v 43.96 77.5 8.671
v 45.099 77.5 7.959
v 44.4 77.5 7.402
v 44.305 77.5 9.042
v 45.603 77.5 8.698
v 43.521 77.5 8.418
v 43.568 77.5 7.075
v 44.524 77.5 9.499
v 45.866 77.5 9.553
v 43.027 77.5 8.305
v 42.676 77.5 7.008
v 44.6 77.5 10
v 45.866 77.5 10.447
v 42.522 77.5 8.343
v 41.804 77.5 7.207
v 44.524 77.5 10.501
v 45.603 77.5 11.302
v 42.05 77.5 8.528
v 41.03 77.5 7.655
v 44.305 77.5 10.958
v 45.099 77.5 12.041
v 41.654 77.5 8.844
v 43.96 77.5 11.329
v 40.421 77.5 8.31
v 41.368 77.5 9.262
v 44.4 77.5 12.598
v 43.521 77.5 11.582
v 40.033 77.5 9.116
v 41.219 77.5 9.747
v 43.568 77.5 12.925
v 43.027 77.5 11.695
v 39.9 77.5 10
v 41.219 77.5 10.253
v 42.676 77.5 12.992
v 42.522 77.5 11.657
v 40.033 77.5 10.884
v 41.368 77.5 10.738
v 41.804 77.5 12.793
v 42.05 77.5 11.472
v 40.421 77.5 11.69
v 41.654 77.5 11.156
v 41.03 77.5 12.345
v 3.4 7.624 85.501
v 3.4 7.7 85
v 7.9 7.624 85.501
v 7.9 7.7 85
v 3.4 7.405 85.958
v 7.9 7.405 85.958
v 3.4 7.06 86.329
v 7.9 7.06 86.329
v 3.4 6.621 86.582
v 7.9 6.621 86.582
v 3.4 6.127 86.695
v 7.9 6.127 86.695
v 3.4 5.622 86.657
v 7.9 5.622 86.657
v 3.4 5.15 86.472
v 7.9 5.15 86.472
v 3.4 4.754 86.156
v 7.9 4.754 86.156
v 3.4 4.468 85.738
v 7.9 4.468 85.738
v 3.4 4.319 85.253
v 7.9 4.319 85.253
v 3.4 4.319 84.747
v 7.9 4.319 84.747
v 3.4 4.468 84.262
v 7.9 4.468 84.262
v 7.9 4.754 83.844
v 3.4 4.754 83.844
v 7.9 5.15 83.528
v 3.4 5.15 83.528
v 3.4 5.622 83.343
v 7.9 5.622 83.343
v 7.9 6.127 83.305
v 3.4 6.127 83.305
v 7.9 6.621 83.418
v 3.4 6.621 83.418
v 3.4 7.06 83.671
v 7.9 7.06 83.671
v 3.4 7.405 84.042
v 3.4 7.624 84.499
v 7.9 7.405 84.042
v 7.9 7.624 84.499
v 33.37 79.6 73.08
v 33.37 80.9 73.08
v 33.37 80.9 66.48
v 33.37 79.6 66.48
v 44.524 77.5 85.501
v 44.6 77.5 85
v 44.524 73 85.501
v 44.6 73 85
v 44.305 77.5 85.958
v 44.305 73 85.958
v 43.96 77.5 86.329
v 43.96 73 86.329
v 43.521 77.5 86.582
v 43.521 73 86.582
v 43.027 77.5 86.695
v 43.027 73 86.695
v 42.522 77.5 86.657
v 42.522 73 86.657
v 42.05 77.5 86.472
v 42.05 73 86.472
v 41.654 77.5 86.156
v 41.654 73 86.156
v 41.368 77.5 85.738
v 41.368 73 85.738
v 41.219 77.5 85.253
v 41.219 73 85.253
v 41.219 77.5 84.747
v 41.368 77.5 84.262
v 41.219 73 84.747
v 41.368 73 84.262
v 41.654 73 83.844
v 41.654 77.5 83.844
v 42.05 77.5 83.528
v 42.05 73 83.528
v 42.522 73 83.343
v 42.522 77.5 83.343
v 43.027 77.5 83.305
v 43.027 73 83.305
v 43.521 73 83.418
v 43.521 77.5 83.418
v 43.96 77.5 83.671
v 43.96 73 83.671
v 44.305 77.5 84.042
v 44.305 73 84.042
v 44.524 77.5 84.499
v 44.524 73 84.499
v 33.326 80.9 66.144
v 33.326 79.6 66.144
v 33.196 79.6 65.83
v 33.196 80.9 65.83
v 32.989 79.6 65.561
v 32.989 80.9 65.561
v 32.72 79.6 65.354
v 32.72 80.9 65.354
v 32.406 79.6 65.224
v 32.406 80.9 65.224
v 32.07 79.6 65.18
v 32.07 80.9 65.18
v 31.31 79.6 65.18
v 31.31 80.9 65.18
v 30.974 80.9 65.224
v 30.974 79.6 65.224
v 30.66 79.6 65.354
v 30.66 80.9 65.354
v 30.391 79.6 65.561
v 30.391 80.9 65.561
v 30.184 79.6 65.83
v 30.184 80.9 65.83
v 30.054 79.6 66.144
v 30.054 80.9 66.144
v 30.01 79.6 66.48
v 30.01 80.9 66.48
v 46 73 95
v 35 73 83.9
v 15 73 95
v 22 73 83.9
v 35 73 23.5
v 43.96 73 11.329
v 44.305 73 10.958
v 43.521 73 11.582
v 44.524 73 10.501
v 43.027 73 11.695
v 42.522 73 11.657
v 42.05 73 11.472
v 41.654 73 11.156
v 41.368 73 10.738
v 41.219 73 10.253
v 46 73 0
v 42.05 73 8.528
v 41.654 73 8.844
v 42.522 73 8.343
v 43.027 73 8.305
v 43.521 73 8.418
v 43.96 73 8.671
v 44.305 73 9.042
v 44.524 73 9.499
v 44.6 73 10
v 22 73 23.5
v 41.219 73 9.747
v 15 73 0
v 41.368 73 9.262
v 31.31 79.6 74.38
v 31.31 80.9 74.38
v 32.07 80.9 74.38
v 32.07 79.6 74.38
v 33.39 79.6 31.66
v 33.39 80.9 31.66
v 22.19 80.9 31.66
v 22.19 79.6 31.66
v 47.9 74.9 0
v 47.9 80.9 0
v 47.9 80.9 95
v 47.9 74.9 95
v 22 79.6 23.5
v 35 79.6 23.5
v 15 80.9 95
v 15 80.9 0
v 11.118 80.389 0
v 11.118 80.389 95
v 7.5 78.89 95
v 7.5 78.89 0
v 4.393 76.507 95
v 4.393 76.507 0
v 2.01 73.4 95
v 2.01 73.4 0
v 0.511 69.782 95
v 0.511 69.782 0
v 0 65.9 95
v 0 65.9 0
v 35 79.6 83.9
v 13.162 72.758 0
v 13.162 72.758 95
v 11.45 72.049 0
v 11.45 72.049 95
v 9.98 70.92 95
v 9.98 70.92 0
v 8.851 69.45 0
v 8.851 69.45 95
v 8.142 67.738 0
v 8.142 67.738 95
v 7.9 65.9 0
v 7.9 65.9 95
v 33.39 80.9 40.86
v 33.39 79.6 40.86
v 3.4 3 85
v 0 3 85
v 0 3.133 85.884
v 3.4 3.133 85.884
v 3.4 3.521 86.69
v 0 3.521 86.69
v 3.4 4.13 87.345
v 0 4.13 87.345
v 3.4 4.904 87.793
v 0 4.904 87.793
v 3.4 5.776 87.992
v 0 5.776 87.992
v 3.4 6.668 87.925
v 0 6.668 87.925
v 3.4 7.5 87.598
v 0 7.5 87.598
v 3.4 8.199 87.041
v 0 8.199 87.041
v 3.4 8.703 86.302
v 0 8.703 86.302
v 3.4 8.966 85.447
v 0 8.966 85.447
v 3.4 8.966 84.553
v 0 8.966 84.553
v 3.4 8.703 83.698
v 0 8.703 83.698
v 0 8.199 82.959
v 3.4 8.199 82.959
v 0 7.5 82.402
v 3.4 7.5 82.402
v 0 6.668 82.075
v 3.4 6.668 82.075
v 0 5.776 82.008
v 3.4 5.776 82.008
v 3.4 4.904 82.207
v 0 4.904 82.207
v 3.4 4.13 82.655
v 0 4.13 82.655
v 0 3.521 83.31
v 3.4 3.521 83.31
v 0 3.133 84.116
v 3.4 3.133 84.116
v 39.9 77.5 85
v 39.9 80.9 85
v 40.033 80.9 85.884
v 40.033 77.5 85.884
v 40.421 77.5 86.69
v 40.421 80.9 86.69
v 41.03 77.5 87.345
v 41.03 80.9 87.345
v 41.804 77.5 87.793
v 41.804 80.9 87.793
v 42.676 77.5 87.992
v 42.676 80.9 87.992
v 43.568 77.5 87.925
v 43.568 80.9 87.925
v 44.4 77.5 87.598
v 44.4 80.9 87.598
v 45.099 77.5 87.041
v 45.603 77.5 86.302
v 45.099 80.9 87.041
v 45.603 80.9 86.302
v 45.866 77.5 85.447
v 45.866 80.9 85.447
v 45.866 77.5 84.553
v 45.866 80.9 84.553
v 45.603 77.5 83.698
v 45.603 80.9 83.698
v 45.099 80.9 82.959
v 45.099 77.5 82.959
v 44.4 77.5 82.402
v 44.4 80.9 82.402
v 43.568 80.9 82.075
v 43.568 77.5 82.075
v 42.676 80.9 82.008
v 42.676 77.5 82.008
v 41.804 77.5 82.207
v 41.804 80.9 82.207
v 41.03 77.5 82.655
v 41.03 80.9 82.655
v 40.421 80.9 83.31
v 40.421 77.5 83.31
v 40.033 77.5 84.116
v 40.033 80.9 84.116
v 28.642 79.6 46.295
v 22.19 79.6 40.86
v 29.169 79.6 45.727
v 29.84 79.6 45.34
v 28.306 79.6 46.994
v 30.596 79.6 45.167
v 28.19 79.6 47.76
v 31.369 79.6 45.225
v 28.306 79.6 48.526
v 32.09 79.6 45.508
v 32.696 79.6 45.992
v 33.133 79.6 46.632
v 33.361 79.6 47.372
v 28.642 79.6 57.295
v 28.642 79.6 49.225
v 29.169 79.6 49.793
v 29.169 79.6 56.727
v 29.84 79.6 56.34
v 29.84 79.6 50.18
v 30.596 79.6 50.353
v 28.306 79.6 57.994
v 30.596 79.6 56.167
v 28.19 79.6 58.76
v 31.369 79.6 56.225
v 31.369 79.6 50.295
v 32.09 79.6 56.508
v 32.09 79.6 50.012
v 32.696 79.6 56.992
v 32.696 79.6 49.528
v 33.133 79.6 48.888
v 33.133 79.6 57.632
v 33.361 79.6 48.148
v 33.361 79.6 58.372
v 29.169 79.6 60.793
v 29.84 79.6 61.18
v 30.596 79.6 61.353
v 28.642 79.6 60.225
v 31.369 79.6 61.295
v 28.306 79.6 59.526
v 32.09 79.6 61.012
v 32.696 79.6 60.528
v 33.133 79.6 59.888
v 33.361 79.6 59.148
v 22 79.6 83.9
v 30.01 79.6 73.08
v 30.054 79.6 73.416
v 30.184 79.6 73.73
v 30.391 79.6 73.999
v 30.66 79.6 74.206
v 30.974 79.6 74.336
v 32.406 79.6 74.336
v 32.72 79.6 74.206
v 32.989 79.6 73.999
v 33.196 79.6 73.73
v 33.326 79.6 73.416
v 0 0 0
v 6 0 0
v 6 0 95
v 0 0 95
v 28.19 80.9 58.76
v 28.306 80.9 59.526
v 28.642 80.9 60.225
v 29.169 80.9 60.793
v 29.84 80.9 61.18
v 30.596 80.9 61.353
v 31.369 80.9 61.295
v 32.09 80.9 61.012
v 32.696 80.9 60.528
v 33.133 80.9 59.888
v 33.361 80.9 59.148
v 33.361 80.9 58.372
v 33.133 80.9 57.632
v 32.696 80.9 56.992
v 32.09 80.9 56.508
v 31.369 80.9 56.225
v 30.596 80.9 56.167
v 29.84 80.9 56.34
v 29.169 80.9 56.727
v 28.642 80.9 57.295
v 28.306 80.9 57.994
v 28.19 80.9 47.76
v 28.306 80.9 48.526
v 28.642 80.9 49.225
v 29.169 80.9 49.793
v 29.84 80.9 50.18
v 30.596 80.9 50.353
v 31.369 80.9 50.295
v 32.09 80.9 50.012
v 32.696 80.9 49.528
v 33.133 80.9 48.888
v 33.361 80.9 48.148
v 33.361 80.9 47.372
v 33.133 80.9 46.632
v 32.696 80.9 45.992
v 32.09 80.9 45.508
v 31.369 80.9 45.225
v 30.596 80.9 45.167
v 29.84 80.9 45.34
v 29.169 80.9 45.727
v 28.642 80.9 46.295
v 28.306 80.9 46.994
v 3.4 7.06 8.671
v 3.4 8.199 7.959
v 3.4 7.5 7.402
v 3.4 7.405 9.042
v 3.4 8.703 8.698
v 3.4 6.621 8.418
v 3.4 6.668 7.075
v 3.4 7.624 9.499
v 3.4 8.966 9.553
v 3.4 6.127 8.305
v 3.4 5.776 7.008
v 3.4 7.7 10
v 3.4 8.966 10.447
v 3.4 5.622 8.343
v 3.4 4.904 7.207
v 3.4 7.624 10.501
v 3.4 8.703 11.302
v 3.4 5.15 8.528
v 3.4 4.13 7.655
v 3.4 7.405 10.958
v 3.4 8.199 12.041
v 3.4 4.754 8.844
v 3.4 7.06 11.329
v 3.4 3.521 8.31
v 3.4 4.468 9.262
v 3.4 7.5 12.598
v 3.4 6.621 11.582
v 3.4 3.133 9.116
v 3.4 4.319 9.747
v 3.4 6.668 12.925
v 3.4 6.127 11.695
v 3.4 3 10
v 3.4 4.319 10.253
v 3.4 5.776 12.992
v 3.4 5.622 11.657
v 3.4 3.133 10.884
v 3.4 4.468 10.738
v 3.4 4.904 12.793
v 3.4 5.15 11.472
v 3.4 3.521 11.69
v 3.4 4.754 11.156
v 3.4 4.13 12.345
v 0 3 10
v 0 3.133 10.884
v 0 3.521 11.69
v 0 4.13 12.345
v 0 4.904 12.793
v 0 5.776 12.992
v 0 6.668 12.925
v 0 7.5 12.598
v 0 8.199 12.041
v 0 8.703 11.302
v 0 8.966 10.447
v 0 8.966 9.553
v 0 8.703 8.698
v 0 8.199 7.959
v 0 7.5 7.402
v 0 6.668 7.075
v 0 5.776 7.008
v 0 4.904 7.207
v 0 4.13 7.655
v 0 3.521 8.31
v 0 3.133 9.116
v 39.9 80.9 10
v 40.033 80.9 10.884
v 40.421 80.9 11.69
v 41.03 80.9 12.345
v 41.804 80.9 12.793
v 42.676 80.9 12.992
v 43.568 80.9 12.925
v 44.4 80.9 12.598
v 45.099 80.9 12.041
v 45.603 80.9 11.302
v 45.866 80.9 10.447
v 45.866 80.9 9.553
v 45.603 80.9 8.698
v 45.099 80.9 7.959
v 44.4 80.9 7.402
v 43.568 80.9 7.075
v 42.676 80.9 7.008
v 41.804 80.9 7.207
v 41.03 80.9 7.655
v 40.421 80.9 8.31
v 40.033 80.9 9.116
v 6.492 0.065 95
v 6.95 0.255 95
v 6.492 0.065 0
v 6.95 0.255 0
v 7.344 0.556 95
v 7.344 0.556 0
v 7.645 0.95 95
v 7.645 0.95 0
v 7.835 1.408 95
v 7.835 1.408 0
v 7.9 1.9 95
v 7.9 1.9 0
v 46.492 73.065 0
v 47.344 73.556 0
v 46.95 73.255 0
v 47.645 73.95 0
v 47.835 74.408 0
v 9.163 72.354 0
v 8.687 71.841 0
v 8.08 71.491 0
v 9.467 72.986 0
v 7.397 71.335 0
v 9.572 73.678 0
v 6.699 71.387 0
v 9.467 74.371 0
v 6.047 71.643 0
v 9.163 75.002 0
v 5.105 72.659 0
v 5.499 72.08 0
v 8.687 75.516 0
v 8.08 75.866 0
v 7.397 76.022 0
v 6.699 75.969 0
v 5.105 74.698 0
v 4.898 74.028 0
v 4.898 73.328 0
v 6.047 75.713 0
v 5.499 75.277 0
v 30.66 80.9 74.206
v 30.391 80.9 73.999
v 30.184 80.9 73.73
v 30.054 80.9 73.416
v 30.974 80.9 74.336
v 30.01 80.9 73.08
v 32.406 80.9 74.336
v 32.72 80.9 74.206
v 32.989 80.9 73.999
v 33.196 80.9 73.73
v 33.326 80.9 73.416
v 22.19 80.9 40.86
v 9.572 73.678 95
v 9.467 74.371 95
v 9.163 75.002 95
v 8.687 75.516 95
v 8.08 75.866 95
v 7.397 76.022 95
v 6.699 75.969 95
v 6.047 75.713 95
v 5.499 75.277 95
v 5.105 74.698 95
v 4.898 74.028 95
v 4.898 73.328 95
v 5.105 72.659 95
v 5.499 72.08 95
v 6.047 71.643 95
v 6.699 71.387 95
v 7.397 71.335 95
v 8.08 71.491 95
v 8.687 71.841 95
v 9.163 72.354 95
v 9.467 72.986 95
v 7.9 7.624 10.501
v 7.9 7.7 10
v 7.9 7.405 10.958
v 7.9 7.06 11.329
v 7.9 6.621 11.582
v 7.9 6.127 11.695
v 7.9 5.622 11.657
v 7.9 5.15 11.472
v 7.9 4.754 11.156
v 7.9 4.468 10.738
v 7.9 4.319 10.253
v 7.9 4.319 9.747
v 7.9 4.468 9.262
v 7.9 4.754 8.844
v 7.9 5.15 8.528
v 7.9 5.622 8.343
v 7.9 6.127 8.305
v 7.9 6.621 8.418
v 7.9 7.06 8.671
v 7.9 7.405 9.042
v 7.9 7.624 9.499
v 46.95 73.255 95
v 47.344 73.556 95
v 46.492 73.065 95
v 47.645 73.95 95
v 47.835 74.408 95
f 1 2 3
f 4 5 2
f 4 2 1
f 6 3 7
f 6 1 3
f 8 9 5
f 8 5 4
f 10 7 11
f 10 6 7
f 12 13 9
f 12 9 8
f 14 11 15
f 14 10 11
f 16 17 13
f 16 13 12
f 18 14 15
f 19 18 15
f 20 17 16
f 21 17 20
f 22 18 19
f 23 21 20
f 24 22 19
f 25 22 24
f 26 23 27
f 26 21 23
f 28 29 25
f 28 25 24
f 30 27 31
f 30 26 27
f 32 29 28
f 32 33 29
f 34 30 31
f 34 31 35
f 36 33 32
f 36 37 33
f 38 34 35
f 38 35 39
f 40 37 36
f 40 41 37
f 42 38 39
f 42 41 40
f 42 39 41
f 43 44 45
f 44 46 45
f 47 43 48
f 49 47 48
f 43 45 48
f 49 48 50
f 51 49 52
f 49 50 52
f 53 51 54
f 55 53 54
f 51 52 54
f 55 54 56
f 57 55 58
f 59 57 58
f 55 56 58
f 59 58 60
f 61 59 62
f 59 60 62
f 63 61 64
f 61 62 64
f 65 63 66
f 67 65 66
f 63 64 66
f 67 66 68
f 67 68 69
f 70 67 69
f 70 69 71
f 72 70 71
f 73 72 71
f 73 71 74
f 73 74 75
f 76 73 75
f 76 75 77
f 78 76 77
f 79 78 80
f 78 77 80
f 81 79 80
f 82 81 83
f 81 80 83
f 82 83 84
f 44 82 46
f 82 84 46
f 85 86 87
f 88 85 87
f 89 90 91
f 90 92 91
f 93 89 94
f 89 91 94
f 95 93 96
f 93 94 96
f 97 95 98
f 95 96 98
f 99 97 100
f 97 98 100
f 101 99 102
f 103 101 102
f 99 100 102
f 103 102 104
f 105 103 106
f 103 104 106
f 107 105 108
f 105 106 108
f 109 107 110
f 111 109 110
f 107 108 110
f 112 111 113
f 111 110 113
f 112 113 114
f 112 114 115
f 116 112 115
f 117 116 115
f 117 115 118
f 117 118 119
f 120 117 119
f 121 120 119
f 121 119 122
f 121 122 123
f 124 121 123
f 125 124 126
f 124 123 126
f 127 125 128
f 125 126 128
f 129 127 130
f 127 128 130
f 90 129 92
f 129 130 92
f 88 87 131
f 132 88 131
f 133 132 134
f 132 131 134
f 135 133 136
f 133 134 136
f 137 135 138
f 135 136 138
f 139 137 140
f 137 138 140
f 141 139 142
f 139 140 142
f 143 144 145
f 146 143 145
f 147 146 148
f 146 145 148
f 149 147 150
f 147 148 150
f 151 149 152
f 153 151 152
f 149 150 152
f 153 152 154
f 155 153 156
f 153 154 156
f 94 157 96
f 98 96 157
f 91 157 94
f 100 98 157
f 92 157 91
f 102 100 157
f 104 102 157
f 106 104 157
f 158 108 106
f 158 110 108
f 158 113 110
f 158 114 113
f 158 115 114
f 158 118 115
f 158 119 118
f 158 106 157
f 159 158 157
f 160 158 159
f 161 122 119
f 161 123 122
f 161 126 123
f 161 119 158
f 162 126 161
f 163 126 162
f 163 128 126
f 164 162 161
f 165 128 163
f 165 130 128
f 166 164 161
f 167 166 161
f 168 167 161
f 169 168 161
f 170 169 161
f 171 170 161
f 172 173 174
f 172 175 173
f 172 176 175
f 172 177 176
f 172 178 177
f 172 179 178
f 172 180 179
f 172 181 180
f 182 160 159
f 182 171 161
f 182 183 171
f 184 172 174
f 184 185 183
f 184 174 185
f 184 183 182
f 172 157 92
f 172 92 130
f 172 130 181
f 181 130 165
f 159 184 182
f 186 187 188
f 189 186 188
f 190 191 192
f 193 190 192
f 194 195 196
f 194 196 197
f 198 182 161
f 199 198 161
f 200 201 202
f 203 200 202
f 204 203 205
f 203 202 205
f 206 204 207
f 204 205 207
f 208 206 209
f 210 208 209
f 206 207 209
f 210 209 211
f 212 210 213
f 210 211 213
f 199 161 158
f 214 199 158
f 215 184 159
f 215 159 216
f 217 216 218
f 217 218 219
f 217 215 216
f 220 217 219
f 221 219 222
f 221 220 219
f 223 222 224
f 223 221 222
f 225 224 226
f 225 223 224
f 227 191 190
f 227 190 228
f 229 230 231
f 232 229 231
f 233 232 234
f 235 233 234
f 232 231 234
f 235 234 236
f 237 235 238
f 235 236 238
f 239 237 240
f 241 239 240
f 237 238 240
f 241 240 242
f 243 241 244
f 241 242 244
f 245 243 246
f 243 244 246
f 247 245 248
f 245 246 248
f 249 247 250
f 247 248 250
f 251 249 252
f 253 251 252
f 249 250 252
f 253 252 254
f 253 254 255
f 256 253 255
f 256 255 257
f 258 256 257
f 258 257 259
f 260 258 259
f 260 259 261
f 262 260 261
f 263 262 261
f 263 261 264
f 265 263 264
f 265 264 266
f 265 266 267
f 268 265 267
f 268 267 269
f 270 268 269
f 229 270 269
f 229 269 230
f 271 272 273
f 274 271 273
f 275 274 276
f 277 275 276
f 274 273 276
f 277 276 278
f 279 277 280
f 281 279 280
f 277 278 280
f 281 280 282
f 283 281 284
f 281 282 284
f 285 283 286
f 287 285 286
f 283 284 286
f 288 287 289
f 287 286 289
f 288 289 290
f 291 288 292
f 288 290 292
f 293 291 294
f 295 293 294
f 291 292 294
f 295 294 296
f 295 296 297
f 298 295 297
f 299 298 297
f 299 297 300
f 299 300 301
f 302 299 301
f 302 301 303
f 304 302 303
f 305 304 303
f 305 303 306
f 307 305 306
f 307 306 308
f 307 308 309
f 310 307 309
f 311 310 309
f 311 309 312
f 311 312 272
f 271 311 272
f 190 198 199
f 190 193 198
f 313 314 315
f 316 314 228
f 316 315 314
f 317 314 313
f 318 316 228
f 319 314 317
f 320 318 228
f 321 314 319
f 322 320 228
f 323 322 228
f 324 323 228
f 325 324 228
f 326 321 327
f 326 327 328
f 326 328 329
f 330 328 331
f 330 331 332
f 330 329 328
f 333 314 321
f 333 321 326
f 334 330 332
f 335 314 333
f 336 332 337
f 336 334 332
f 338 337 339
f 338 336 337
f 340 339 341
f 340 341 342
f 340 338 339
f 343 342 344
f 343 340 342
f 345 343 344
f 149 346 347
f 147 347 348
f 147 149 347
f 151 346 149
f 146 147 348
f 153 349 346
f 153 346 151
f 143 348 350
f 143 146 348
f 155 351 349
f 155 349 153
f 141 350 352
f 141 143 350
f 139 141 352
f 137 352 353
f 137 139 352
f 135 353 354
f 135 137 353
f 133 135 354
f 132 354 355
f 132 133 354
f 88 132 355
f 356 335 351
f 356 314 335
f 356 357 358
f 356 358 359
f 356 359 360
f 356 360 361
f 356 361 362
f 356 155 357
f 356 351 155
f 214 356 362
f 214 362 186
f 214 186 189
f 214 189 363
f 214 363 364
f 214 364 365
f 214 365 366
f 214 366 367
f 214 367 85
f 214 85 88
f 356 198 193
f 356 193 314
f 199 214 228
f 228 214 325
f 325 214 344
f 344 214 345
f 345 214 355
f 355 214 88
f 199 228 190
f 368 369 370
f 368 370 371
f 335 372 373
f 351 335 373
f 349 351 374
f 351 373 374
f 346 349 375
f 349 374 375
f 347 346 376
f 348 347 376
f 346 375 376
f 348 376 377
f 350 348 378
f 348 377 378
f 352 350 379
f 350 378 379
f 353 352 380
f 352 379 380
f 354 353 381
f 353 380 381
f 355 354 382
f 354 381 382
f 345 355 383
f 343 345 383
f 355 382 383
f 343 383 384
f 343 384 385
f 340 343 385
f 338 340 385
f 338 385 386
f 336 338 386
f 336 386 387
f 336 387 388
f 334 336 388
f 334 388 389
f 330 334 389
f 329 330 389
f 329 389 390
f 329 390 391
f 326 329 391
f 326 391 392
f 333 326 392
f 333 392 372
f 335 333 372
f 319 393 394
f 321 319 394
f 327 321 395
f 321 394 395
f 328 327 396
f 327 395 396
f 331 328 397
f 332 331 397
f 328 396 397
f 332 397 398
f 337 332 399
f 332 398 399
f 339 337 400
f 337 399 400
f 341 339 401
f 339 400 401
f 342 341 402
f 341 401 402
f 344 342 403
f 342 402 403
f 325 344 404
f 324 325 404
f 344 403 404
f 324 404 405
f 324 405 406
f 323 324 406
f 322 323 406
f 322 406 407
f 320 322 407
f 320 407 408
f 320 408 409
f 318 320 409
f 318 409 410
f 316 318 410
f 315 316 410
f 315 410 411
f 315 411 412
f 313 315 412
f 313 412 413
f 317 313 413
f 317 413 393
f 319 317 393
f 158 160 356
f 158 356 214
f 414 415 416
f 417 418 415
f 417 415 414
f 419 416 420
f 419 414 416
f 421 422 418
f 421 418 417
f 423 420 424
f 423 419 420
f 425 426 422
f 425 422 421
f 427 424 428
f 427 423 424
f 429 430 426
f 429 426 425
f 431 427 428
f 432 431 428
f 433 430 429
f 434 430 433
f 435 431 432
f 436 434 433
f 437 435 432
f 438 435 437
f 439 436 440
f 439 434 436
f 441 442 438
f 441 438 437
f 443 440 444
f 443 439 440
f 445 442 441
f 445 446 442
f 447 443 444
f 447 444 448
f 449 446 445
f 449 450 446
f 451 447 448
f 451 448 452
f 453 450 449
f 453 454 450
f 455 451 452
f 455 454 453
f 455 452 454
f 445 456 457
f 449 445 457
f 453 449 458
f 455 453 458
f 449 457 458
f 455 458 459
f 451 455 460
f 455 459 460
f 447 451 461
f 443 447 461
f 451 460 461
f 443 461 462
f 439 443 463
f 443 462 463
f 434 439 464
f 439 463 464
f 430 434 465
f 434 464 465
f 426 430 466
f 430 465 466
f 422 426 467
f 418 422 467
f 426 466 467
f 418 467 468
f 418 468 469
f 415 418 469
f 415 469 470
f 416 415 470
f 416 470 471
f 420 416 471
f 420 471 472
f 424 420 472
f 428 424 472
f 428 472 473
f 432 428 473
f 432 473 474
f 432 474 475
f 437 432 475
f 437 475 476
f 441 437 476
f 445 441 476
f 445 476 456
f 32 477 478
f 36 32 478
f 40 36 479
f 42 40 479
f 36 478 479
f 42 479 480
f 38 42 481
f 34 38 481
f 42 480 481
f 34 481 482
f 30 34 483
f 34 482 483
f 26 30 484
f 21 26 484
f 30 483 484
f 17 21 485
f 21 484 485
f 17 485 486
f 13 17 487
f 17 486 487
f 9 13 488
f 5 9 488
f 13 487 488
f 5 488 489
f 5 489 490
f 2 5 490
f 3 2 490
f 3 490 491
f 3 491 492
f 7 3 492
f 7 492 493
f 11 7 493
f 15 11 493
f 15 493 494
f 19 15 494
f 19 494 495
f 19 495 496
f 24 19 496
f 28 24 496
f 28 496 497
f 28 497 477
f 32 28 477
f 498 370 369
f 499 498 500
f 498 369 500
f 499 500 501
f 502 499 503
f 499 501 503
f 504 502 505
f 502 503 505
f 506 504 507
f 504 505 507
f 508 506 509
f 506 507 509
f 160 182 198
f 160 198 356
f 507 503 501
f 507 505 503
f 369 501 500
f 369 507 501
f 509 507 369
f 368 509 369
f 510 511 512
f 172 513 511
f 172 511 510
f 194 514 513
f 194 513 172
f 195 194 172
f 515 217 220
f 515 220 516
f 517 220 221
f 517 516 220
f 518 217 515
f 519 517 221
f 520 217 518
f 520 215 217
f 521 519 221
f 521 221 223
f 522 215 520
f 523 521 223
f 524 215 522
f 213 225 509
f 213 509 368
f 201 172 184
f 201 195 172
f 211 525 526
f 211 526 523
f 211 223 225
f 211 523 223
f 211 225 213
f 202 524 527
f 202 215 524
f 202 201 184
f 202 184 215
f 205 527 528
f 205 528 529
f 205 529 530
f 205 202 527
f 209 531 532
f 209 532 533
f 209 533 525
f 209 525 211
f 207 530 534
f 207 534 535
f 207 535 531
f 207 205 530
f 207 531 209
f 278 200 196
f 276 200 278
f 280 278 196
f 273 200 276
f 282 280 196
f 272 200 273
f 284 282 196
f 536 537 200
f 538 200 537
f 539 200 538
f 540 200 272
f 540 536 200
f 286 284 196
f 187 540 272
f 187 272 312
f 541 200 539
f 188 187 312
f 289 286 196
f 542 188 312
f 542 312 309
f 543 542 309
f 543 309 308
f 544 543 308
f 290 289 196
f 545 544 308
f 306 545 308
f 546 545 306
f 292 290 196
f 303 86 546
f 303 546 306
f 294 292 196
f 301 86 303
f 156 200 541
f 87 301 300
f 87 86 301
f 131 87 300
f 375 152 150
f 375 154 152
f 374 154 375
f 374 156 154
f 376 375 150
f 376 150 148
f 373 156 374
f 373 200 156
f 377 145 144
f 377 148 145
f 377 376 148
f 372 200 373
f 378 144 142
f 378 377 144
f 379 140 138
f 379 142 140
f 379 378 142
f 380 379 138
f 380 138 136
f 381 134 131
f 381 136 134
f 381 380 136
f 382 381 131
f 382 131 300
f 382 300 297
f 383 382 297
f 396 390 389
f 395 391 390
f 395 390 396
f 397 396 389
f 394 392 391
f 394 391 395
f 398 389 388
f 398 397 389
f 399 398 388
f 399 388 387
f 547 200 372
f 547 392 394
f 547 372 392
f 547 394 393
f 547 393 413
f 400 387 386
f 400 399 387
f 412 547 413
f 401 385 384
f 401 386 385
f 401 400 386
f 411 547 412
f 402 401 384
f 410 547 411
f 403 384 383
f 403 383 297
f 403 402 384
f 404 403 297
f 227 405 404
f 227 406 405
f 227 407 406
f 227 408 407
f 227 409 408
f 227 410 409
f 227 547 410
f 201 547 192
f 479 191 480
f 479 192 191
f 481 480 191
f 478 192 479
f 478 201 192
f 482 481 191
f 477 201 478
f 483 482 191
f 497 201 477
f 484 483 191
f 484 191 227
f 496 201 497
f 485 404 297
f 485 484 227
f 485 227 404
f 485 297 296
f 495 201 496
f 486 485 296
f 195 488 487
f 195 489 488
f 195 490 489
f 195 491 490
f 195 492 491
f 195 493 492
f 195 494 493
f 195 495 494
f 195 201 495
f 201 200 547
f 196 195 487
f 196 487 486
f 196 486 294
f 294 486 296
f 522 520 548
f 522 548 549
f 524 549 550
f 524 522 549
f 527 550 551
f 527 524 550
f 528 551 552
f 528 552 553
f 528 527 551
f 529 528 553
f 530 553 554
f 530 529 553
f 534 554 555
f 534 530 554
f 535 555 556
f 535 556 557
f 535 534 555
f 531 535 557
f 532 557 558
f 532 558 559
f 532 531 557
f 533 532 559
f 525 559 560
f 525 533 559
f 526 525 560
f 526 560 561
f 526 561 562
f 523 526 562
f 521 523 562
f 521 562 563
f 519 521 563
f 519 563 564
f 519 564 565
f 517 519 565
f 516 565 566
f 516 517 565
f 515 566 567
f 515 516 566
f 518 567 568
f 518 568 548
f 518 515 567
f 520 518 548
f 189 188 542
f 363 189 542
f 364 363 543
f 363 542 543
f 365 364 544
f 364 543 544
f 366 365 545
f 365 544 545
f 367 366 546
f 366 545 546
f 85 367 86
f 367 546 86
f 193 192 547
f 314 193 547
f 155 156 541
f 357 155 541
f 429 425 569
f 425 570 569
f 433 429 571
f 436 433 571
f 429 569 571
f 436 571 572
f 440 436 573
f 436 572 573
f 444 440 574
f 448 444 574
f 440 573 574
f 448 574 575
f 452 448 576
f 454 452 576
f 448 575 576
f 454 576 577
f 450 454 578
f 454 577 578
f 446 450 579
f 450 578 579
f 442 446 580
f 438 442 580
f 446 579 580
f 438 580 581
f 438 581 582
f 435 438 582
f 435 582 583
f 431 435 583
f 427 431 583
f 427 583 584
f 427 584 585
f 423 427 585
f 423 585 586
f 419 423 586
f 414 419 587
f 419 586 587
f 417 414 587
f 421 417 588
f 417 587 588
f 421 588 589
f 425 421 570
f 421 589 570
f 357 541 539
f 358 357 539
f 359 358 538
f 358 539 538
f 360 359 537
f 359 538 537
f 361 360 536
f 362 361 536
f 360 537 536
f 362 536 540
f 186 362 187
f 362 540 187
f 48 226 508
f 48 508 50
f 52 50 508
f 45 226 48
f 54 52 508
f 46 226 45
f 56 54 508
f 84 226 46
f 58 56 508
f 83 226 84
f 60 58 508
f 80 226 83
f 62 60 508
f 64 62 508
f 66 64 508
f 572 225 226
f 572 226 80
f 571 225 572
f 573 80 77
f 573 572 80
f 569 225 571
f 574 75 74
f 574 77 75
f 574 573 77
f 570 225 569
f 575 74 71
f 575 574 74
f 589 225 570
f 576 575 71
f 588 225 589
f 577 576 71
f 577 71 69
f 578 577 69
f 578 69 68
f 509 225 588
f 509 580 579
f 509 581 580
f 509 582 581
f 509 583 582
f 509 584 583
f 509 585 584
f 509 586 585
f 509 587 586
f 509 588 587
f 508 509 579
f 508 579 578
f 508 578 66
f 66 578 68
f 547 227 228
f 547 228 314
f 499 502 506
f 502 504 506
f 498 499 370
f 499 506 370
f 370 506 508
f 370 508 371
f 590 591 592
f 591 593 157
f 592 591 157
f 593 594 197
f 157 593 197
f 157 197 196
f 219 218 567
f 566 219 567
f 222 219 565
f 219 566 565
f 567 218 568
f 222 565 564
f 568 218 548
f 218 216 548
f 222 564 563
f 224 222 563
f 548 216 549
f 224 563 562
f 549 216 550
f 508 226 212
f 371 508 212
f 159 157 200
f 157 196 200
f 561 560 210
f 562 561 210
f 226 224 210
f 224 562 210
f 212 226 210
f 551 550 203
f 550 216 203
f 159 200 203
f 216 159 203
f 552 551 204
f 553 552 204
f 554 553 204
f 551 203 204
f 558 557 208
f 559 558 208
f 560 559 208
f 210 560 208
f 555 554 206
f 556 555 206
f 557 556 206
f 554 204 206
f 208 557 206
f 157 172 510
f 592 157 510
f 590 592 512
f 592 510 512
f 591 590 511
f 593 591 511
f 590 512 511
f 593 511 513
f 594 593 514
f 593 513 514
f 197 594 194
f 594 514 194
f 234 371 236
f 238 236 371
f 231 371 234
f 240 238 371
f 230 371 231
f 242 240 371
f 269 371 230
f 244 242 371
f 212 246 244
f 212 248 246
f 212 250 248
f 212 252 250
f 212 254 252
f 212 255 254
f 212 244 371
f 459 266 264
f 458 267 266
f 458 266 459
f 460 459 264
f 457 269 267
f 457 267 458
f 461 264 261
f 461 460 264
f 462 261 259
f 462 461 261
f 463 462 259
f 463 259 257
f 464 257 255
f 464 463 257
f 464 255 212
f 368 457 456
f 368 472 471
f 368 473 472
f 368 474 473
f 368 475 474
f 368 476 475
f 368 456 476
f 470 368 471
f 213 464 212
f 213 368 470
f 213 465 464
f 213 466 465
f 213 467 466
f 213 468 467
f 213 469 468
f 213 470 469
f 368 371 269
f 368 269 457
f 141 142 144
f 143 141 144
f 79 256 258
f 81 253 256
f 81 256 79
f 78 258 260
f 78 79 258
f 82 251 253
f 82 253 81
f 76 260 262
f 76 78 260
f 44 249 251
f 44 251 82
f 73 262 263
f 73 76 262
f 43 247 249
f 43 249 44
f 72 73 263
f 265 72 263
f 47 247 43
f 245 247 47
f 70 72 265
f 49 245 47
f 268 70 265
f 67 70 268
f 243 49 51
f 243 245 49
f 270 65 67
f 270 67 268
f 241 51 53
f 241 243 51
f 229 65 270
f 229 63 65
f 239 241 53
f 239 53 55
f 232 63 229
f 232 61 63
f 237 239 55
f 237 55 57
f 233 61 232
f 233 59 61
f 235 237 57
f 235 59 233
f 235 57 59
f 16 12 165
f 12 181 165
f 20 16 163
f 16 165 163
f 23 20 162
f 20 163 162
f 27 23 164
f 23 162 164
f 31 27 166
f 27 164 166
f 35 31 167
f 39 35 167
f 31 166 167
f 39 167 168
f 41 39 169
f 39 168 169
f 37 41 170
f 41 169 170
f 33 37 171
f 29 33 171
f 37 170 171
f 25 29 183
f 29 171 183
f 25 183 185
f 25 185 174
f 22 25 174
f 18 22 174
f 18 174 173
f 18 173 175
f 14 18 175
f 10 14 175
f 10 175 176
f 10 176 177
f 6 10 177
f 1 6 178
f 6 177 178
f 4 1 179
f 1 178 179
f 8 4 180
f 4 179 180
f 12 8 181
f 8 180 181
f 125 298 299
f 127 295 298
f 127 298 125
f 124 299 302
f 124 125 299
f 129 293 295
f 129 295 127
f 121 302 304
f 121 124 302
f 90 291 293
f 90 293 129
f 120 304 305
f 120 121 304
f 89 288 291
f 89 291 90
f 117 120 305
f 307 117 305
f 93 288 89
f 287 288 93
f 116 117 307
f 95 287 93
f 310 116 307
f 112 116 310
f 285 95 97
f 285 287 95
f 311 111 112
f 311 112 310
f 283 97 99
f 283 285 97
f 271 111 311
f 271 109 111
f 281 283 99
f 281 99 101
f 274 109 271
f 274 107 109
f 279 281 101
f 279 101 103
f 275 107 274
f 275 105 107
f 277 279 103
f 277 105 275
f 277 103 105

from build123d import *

# Parameters (mm, degrees)
SKETCH_R            = 2.35
PAD_DEPTH           = 95
HOLE_D              = 3.4
HOLE_CBORE_D        = 6
HOLE_CBORE_DEPTH    = 3.4
HOLE001_D           = 3.4
HOLE001_CBORE_D     = 6
HOLE001_CBORE_DEPTH = 3.4
SKETCH003_R         = 2.6
SKETCH003_W         = 11.2
SKETCH003_H         = 9.2
POCKET_DEPTH        = 80.901
SKETCH004_W         = 13
SKETCH004_H         = 60.4
POCKET001_DEPTH     = 6.6


with BuildPart() as part:
    # Sketch → Pad (new body)
    with BuildSketch(Plane.XY):
        with BuildLine():
            Line((0, 0), (0, 65.9))
            ThreePointArc((15, 80.9), (4.393398, 76.506602), (0, 65.9))
            Line((15, 80.9), (47.9, 80.9))
            Line((47.9, 80.9), (47.9, 74.8998))
            ThreePointArc((46.0002, 73), (47.343561, 73.556439), (47.9, 74.8998))
            Line((46.0002, 73), (14.9999, 73))
            ThreePointArc((14.9999, 73), (9.979513, 70.920487), (7.9, 65.9001))
            Line((7.9, 65.9001), (7.9, 1.8998))
            ThreePointArc((6.0002, 0), (7.343561, 0.556439), (7.9, 1.8998))
            Line((6.0002, 0), (0, 0))
        make_face()
        with Locations((7.2218, 73.6782)):
            Circle(SKETCH_R, mode=Mode.SUBTRACT)
    extrude(amount=PAD_DEPTH)

    # Hole (through all)
    with Locations(Plane(origin=(0, 0, 0), x_dir=(0, -1, 0), z_dir=(-1, 0, 0))):
        with Locations((-6, 10), (-6, 85)):
            CounterBoreHole(HOLE_D / 2, HOLE_CBORE_D / 2, HOLE_CBORE_DEPTH)

    # Hole001 (through all)
    with Locations(Plane(origin=(0, 80.9, 0), x_dir=(-1, 0, 0), z_dir=(0, 1, 0))):
        with Locations((-42.9, 10), (-42.9, 85)):
            CounterBoreHole(HOLE001_D / 2, HOLE001_CBORE_D / 2, HOLE001_CBORE_DEPTH)

    # Sketch003 (on Face10 of Hole001) → Pocket (cut, through all)
    with BuildSketch(Plane(origin=(0, 80.9, 0), x_dir=(-1, 0, 0), z_dir=(0, 1, 0))):
        with Locations((-30.79, 58.76)):
            Circle(SKETCH003_R)
        with Locations((-30.79, 47.76)):
            Circle(SKETCH003_R)
        with BuildLine():
            Line((-31.31, 74.38), (-32.07, 74.38))
            ThreePointArc((-32.07, 74.38), (-32.989239, 73.999239), (-33.37, 73.08))
            Line((-33.37, 73.08), (-33.37, 66.48))
            ThreePointArc((-33.37, 66.48), (-32.989239, 65.560761), (-32.07, 65.18))
            Line((-32.07, 65.18), (-31.31, 65.18))
            ThreePointArc((-31.31, 65.18), (-30.390761, 65.560761), (-30.01, 66.48))
            Line((-30.01, 66.48), (-30.01, 73.08))
            ThreePointArc((-30.01, 73.08), (-30.390761, 73.999239), (-31.31, 74.38))
        make_face()
        with Locations((-27.79, 36.26)):
            Rectangle(SKETCH003_W, SKETCH003_H)
    extrude(amount=-POCKET_DEPTH, mode=Mode.SUBTRACT)

    # Sketch004 (on Face13 of Pocket) → Pocket001 (cut)
    with BuildSketch(Plane.XZ.offset(-73)):
        with Locations((28.5, 53.7)):
            Rectangle(SKETCH004_W, SKETCH004_H)
    extrude(amount=-POCKET001_DEPTH, mode=Mode.SUBTRACT)


solid = part.part
